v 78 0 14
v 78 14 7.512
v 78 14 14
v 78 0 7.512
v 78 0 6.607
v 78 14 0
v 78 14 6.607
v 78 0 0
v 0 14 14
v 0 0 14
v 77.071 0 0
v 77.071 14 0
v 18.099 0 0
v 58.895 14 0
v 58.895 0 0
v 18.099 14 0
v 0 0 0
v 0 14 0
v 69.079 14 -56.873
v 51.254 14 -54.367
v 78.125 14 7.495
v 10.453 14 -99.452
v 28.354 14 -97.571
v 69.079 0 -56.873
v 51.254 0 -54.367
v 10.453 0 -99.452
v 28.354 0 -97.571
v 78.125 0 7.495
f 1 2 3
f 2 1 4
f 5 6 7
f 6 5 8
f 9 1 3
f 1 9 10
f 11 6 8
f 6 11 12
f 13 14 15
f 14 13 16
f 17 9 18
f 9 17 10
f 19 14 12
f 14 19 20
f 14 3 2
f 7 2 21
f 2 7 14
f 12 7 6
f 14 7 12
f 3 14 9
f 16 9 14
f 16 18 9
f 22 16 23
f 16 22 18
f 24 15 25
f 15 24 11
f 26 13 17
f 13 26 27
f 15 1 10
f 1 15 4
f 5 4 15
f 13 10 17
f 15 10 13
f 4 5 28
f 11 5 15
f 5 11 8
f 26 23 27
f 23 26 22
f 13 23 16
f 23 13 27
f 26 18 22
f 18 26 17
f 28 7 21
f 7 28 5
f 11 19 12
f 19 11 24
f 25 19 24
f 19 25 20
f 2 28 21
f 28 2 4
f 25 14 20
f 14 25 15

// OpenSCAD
cube([78,14,14]);
rotate([0,90-6,0]) cube([100,14,18]);
translate([78-17.7,0,10]) rotate([0,90+8,0]) cube([65,14,18]);
